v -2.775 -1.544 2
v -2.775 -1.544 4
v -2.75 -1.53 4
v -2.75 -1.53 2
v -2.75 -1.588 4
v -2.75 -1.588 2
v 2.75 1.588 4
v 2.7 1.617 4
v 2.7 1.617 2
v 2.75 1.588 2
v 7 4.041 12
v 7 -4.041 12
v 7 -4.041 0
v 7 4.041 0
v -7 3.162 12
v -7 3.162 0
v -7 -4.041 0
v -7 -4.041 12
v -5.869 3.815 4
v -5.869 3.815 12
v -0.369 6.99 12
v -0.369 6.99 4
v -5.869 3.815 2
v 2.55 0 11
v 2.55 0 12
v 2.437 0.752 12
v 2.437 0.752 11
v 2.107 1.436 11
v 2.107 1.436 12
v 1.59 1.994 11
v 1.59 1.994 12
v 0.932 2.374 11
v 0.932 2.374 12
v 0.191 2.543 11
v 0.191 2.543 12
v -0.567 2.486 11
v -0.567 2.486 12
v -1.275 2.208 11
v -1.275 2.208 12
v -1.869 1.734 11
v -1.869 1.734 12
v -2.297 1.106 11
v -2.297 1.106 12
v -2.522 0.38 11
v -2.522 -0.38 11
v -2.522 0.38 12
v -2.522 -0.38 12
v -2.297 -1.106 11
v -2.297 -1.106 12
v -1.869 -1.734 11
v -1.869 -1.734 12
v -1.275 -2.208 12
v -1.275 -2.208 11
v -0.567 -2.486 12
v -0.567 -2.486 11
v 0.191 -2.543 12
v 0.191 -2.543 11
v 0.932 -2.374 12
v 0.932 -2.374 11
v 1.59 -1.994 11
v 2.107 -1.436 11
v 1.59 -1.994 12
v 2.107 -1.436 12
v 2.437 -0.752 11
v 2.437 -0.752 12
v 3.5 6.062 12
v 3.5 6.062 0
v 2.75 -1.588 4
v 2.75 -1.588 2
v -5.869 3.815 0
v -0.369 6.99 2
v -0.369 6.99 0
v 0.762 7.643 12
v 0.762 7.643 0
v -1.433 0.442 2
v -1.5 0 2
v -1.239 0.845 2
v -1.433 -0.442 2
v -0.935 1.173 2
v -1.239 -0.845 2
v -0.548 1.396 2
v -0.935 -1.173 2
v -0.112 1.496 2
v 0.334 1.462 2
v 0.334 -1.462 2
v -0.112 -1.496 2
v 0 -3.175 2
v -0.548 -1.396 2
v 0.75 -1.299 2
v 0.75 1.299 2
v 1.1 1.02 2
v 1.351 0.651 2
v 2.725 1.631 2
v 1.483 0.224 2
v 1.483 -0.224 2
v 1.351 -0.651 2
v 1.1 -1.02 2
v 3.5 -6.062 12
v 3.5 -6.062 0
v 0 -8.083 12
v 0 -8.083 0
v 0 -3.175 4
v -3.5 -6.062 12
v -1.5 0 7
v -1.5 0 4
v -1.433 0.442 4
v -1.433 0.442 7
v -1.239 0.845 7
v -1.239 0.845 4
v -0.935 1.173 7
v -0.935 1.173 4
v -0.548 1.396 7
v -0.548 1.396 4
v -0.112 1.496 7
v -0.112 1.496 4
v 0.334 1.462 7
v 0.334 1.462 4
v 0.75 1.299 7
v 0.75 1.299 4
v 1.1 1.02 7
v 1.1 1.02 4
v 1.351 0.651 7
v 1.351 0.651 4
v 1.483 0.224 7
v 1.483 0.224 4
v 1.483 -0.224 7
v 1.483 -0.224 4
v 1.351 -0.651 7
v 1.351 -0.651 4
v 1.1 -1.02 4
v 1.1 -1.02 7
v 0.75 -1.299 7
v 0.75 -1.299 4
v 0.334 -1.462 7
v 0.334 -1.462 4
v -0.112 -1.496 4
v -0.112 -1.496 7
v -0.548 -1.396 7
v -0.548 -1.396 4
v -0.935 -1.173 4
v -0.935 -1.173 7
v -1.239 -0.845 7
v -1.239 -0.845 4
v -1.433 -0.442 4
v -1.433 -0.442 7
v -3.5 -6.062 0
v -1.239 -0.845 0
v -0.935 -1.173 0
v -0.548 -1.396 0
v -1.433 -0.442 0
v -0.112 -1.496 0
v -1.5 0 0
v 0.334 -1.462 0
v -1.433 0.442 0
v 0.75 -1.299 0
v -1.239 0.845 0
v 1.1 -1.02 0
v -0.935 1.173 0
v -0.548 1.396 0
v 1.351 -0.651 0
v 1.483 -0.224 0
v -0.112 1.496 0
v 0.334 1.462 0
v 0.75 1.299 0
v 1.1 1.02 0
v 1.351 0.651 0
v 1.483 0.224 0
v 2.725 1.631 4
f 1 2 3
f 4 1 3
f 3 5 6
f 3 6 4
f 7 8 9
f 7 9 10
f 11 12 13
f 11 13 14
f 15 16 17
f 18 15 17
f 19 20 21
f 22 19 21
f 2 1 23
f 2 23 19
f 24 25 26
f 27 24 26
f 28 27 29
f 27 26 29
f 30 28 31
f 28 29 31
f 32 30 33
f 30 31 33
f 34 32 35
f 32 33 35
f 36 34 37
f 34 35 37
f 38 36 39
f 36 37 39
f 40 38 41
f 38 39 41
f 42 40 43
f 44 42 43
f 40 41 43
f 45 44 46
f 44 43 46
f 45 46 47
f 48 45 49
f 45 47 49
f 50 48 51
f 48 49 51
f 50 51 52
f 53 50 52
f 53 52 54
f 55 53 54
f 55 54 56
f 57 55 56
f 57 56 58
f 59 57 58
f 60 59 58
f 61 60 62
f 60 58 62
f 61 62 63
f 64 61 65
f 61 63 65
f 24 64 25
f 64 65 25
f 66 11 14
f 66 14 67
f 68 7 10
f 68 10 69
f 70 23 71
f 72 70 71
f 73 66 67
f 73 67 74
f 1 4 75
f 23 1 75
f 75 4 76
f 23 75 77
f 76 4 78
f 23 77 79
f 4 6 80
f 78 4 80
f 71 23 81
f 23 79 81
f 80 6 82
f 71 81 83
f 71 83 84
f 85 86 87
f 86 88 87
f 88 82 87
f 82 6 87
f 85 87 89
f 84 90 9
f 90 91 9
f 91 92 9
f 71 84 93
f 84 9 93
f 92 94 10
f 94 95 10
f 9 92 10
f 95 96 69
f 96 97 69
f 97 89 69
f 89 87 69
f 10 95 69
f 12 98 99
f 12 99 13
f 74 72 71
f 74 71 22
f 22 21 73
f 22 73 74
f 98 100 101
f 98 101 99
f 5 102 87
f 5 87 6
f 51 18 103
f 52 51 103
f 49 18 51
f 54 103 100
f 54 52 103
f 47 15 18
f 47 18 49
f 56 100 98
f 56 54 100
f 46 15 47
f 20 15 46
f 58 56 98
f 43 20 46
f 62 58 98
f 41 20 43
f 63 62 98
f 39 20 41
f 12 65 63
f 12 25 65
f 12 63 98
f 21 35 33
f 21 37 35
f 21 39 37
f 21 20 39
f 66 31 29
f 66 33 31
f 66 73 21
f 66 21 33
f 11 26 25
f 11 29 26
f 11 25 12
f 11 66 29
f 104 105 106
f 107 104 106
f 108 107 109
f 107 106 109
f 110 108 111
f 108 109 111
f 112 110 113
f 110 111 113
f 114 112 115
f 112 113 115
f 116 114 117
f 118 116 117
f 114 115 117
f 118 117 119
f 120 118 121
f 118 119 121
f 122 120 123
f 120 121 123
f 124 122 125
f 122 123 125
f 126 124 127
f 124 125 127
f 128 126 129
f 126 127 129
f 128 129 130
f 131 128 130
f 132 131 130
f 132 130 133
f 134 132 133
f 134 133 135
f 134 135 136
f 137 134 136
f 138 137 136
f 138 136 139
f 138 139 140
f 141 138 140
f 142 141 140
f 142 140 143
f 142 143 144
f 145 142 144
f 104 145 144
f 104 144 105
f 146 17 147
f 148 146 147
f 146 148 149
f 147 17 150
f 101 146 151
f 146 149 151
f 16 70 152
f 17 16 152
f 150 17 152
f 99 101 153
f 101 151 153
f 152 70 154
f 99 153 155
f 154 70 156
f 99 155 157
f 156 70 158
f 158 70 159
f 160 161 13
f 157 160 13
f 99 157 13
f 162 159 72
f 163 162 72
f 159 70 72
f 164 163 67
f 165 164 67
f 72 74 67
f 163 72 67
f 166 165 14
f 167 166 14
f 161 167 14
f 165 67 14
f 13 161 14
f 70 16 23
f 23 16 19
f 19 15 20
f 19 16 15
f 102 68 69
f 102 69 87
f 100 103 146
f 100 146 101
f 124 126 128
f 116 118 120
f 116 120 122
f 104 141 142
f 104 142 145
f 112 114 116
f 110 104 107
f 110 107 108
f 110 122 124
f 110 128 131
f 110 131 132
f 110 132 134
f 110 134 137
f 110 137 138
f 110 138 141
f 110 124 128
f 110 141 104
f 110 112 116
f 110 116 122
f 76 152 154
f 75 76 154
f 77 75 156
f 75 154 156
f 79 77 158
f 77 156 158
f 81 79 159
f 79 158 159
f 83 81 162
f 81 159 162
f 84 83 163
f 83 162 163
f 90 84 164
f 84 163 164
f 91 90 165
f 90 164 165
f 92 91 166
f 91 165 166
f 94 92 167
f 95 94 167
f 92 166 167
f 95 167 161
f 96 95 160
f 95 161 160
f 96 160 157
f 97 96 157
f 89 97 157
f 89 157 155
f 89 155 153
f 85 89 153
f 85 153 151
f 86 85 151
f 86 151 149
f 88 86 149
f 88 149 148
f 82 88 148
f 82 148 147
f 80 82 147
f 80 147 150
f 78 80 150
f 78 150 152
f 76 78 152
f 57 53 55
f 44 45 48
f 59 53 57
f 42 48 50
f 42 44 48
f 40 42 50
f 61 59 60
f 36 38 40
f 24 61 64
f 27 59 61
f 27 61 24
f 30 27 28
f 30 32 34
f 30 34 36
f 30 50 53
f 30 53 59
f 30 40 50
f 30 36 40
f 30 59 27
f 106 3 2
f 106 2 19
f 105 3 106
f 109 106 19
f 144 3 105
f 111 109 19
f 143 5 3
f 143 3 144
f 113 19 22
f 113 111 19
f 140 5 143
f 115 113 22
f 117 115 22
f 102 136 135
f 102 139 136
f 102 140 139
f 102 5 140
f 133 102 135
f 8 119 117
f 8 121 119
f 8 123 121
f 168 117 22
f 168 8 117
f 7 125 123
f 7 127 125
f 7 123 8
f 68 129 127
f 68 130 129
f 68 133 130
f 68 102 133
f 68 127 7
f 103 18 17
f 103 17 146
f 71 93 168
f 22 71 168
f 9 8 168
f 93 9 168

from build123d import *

# Parameters (mm, degrees)
SKETCH1_R           = 7
BOSS_EXTRUDE1_DEPTH = 12
SKETCH2_R           = 2.55
CUT_EXTRUDE1_DEPTH  = 1
SKETCH3_R           = 1.5
CUT_EXTRUDE2_DEPTH  = 4
CUT_EXTRUDE3_DEPTH  = 2
SKETCH5_W           = 6.350852962
SKETCH5_H           = 2
CUT_EXTRUDE4_DEPTH  = 5
SKETCH5_2_W         = 6.350852962
SKETCH5_2_H         = 2
CUT_EXTRUDE5_DEPTH  = 2.7
SKETCH6_R           = 1.5
CUT_EXTRUDE6_DEPTH  = 7
BOSS_EXTRUDE2_DEPTH = 12
CUT_EXTRUDE7_DEPTH  = 12
CUT_EXTRUDE8_DEPTH  = 12


with BuildPart() as part:
    # Sketch1 → Boss-Extrude1 (new body)
    with BuildSketch(Plane.XY):
        Circle(SKETCH1_R)
    extrude(amount=BOSS_EXTRUDE1_DEPTH)

    # Sketch2 → Cut-Extrude1 (cut)
    with BuildSketch(Plane.XY.offset(12)):
        Circle(SKETCH2_R)
    extrude(amount=-CUT_EXTRUDE1_DEPTH, mode=Mode.SUBTRACT)

    # Sketch3 → Cut-Extrude2 (cut)
    with BuildSketch(Plane(origin=(0, 0, 0), x_dir=(-1, 0, 0), z_dir=(0, 0, -1))):
        Circle(SKETCH3_R)
    extrude(amount=-CUT_EXTRUDE2_DEPTH, mode=Mode.SUBTRACT)

    # Sketch4 → Cut-Extrude3 (cut)
    with BuildSketch(Plane(origin=(0, 0, 4), x_dir=(-1, 0, 0), z_dir=(0, 0, -1))):
        Polygon((0, 3.175426481), (-2.75, 1.58771324), (-2.75, -1.58771324), (0, -3.175426481), (2.75, -1.58771324), (2.75, 1.58771324), align=None)
    extrude(amount=CUT_EXTRUDE3_DEPTH, mode=Mode.SUBTRACT)

    # Sketch5 → Cut-Extrude4 (cut)
    with BuildSketch(Plane(origin=(-1.375, 2.38156986, 0), x_dir=(0.866025404, 0.5, 0), z_dir=(0.5, -0.866025404, 0))):
        with Locations((0, 3)):
            Rectangle(SKETCH5_W, SKETCH5_H)
    extrude(amount=-CUT_EXTRUDE4_DEPTH, mode=Mode.SUBTRACT)

    # Sketch5<2> → Cut-Extrude5 (cut)
    with BuildSketch(Plane(origin=(-1.375, 2.38156986, 0), x_dir=(0.866025404, 0.5, 0), z_dir=(0.5, -0.866025404, 0))):
        with Locations((0, 3)):
            Rectangle(SKETCH5_2_W, SKETCH5_2_H)
    extrude(amount=CUT_EXTRUDE5_DEPTH, mode=Mode.SUBTRACT)

    # Sketch6 → Cut-Extrude6 (cut)
    with BuildSketch(Plane(origin=(0, 0, 0), x_dir=(-1, 0, 0), z_dir=(0, 0, -1))):
        Circle(SKETCH6_R)
    extrude(amount=-CUT_EXTRUDE6_DEPTH, mode=Mode.SUBTRACT)

    # Sketch7 → Boss-Extrude2 (add)
    with BuildSketch(Plane.XY.offset(12)):
        with BuildLine():
            Line((-5.869161212, 3.814832456), (-6.25, 4.474464586))
            Line((-6.25, 4.474464586), (-7, 4.041451884))
            Line((-7, 4.041451884), (-7, 0))
            ThreePointArc((-7, 0), (-6.711338484, 1.989456146), (-5.869161212, 3.814832456))
        make_face()
        with BuildLine():
            Line((3.499999838, 6.06217792), (0, 8.082903769))
            Line((0, 8.082903769), (-0.75, 7.649891067))
            Line((-0.75, 7.649891067), (-0.369161212, 6.990258937))
            ThreePointArc((-0.369161212, 6.990258937), (1.632749589, 6.806917715), (3.499999838, 6.06217792))
        make_face()
        with BuildLine():
            Line((7, 4.041451884), (3.499999838, 6.06217792))
            ThreePointArc((3.499999838, 6.06217792), (6.06217778, 3.500000081), (7, 0))
            Line((7, 0), (7, 4.041451884))
        make_face()
        with BuildLine():
            Line((7, -4.041451884), (7, 0))
            ThreePointArc((7, 0), (6.062177778, -3.500000084), (3.499999831, -6.062177924))
            Line((3.499999831, -6.062177924), (7, -4.041451884))
        make_face()
        with BuildLine():
            Line((0, -8.082903769), (3.499999831, -6.062177924))
            ThreePointArc((3.499999831, -6.062177924), (-1.13e-07, -7), (-3.500000026, -6.062177811))
            Line((-3.500000026, -6.062177811), (0, -8.082903769))
        make_face()
        with BuildLine():
            ThreePointArc((-3.500000026, -6.062177811), (-6.062177834, -3.499999987), (-7, 0))
            Line((-7, 0), (-7, -4.041451884))
            Line((-7, -4.041451884), (-3.500000026, -6.062177811))
        make_face()
    extrude(amount=-BOSS_EXTRUDE2_DEPTH)

    # Sketch7<4> → Cut-Extrude7 (cut)
    with BuildSketch(Plane.XY.offset(12)):
        with BuildLine():
            ThreePointArc((-0.369161212, 6.990258937), (-1.989456099, 6.711338498), (-3.499999915, 6.062177876))
            ThreePointArc((-3.499999915, 6.062177876), (-4.817461512, 5.078588838), (-5.869161212, 3.814832456))
            Line((-5.869161212, 3.814832456), (-0.369161212, 6.990258937))
        make_face()
    extrude(amount=-CUT_EXTRUDE7_DEPTH, mode=Mode.SUBTRACT)

    # Sketch8 → Cut-Extrude8 (cut)
    with BuildSketch(Plane.XY.offset(12)):
        Polygon((-7, 3.161942377), (-5.869161212, 3.814832456), (-6.25, 4.474464586), (-7, 4.041451884), align=None)
        Polygon((-0.75, 7.649891067), (-0.369161212, 6.990258937), (0.761677576, 7.643149015), (0, 8.082903769), align=None)
    extrude(amount=-CUT_EXTRUDE8_DEPTH, mode=Mode.SUBTRACT)


solid = part.part
